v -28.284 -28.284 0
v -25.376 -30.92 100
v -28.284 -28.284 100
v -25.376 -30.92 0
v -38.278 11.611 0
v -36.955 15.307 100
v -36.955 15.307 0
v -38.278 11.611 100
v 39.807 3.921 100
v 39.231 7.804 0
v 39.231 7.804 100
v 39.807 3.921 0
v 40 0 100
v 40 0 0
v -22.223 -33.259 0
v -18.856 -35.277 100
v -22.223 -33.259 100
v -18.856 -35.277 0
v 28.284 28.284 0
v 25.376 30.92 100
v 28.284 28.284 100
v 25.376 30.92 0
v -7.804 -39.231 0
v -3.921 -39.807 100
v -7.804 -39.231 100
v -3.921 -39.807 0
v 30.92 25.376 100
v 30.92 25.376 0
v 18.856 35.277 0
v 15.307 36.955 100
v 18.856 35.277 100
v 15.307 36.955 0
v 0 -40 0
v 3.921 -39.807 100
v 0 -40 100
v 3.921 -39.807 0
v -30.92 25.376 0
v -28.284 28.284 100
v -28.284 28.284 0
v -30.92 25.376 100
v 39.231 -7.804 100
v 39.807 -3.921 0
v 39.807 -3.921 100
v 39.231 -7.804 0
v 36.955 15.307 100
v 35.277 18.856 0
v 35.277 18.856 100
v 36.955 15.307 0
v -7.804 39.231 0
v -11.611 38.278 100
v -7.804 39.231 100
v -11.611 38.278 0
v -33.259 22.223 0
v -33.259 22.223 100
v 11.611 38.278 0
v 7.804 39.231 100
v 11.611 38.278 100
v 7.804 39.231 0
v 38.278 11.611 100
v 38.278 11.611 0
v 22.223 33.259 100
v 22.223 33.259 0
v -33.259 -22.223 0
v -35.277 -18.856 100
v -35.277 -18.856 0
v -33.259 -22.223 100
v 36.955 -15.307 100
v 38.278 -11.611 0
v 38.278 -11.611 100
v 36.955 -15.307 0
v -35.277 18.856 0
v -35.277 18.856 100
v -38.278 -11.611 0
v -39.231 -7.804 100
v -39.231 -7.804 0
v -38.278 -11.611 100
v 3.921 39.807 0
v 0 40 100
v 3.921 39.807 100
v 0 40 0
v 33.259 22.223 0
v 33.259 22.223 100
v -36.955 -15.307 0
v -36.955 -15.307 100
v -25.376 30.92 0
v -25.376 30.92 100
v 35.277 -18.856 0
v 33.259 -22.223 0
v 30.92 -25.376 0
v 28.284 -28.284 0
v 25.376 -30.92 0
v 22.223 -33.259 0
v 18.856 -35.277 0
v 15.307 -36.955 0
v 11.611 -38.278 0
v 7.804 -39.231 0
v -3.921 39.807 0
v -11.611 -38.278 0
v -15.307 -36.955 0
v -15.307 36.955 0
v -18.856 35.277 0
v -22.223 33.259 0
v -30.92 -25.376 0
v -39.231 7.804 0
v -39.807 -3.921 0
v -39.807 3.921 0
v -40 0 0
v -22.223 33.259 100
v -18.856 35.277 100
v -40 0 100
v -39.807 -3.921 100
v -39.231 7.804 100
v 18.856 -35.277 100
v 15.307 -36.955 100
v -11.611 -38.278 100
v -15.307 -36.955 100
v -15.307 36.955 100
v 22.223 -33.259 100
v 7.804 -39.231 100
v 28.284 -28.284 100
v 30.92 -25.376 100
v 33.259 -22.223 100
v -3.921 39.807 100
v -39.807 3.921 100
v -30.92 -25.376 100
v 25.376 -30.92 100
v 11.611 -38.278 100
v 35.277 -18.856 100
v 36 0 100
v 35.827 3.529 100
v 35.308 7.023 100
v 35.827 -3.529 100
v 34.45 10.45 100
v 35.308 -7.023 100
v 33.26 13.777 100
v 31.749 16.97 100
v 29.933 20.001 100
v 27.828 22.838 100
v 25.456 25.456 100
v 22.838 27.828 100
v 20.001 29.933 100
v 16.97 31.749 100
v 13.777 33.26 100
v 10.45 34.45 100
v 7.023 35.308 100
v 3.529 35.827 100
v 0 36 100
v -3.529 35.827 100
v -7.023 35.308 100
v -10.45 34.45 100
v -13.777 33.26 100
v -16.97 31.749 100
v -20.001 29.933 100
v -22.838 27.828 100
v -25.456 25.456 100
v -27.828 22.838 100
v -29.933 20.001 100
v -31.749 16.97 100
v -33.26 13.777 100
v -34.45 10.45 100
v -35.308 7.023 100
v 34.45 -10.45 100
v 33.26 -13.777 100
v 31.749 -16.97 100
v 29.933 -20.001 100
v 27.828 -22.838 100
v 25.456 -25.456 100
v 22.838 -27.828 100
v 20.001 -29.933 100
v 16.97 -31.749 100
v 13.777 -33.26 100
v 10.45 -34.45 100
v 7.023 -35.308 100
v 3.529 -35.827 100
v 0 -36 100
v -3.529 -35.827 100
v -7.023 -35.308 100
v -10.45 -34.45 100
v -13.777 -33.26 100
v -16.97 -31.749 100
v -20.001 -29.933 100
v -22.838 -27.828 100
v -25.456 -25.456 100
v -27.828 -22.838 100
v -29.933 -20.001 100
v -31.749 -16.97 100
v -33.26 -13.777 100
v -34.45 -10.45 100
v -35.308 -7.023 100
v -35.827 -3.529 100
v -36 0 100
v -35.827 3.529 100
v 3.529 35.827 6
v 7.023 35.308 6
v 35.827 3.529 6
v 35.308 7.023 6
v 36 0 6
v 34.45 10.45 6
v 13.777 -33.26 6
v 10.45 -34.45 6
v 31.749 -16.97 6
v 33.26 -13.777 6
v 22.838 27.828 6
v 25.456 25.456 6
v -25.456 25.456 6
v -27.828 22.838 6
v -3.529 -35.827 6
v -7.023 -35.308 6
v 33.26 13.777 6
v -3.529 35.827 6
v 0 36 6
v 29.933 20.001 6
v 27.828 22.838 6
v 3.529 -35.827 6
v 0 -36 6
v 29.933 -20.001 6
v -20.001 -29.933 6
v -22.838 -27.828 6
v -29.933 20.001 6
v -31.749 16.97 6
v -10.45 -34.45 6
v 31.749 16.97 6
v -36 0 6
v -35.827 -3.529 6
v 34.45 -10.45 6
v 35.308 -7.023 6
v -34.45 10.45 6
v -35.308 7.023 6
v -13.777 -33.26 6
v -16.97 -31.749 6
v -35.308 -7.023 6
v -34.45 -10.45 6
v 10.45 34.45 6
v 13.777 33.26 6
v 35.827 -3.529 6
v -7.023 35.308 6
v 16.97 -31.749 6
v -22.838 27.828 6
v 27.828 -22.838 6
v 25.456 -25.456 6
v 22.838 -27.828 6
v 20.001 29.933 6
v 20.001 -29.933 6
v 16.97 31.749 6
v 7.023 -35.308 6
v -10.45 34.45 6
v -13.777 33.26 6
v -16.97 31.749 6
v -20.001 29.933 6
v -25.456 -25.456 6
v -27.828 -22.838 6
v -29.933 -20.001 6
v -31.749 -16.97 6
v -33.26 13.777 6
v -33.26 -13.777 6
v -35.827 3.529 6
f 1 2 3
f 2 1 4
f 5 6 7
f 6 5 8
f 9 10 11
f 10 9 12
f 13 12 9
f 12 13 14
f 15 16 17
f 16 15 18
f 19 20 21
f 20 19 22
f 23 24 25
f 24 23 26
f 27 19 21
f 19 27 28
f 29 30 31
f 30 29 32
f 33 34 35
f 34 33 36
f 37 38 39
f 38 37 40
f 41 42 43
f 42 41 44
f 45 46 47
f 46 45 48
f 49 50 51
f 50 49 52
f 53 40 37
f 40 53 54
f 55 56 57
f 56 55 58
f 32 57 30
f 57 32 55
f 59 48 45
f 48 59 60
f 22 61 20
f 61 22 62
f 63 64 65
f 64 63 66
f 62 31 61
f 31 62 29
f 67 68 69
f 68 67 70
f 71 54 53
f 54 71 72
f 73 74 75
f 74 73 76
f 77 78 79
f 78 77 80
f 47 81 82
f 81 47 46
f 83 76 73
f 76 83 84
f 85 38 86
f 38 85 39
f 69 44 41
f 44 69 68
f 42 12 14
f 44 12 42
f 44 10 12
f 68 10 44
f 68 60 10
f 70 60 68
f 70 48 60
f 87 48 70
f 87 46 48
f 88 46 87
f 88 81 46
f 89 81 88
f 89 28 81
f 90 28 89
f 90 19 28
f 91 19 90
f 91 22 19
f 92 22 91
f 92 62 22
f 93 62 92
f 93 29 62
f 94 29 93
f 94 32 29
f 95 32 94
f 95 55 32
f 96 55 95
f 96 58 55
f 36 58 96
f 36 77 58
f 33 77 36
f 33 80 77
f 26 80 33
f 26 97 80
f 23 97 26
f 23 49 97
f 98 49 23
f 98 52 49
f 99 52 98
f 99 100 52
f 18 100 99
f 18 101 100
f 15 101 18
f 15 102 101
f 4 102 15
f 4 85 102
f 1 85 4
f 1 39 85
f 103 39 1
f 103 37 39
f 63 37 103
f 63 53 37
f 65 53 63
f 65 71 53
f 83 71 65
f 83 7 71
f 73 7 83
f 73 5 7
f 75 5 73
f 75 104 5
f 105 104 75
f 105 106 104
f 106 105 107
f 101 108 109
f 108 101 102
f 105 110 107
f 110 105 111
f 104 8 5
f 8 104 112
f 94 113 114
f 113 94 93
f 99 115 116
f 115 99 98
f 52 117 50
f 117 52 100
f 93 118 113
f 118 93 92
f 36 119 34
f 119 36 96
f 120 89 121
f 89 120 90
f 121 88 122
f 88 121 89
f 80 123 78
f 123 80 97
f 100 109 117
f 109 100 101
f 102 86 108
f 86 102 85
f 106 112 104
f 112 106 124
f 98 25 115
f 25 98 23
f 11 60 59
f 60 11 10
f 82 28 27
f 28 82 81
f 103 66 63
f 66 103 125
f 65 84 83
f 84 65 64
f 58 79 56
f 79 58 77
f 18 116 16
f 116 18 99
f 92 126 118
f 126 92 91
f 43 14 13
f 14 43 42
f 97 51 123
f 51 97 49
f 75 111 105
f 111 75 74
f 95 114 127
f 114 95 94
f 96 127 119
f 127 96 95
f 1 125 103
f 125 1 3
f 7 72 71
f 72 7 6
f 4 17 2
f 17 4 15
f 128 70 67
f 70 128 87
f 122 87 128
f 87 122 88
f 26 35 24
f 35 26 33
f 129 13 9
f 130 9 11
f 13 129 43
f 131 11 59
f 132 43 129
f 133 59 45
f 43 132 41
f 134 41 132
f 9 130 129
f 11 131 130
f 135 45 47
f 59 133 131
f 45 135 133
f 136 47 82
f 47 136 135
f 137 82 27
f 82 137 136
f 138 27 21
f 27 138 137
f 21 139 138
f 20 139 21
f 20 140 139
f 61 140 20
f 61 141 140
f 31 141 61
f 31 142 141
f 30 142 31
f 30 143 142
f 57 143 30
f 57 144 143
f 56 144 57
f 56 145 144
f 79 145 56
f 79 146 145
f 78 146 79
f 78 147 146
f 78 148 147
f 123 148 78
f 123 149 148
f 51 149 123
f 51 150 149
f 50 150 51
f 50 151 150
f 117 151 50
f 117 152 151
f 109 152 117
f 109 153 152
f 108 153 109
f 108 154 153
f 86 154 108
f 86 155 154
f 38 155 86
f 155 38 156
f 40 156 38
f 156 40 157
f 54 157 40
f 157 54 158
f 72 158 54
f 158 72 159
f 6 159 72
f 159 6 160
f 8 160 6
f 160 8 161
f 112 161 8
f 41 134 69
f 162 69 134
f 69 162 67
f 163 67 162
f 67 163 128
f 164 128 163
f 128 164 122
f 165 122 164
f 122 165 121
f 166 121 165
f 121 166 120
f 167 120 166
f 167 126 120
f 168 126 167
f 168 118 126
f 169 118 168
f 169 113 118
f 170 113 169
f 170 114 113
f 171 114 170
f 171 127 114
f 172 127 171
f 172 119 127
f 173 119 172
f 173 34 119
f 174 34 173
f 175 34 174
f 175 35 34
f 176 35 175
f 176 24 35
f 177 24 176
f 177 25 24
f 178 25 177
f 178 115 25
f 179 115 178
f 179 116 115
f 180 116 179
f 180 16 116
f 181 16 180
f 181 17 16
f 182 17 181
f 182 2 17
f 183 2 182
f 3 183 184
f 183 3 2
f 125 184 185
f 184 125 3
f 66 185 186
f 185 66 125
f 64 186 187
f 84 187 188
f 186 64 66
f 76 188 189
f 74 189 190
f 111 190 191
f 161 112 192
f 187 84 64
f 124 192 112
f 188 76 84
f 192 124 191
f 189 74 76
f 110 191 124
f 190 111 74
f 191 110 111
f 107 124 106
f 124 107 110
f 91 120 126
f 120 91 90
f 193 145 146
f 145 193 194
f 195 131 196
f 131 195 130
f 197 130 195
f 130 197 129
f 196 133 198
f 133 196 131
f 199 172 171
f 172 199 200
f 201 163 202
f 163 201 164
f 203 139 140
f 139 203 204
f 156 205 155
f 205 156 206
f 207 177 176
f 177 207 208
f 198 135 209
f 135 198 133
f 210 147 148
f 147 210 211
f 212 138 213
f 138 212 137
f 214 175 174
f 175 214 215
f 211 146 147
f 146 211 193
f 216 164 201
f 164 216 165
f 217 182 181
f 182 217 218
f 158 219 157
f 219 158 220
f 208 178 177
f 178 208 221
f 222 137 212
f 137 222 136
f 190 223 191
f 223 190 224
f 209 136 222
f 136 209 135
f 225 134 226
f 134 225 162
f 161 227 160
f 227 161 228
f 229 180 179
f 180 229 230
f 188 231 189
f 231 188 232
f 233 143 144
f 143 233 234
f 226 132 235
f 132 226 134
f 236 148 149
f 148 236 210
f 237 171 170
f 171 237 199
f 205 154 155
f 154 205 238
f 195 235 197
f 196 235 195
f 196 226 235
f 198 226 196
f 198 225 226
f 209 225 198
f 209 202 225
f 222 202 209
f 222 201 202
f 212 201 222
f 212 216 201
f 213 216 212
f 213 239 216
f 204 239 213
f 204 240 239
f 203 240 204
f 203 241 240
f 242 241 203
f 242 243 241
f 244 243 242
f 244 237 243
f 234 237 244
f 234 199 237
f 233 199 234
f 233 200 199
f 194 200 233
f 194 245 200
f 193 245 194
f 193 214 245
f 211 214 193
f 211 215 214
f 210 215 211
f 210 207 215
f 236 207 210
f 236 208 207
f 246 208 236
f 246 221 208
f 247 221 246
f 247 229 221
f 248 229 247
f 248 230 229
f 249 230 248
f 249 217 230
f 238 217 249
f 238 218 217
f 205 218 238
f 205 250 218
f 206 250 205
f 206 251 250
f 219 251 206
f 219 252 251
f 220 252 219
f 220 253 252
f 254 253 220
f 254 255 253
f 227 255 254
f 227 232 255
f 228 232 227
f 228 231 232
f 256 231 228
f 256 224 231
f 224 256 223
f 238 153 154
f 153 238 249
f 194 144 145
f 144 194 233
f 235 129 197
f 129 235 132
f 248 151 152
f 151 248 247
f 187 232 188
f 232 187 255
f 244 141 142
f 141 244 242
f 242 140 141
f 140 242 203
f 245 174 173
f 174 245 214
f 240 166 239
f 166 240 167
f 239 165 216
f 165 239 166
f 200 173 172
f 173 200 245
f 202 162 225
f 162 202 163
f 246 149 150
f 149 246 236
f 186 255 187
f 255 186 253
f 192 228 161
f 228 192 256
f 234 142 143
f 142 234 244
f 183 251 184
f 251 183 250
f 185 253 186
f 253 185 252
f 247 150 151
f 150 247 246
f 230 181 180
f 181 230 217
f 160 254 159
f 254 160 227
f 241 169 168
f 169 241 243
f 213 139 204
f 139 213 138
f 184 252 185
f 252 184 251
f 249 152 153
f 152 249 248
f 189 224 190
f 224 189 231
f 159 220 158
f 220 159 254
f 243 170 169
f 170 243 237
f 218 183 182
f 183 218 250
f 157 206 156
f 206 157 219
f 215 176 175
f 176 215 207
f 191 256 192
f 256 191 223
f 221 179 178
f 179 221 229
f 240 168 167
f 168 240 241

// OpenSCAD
$fn = 64;

// パラメータ
outer_diameter = 80;
height = 100;
wall_thickness = 4;
bottom_thickness = 6;
handle_protrusion = 12; // 外径方向への飛び出し量
handle_ring_thickness = 12; // 取手の太さ（直径）

// 内寸の計算
inner_diameter = outer_diameter - (2 * wall_thickness);
inner_height = height - bottom_thickness;

// 取っ手の計算
// 取っ手の外側の端が「外径 + 飛び出し量」になるように配置
// 外径半径 = 40mm, 飛び出し = 12mm => 外端 = 52mm
// 取っ手半径 = 6mm (直径12mm)
// 取っ手の中心半径 = 52 - 6 = 46mm
handle_r = handle_ring_thickness / 2;
handle_major_r = (outer_diameter / 2) + handle_protrusion - handle_r;

// 形状の構築
union() {
    // マグカップ本体
    difference() {
        // 外側の円柱
        cylinder(d = outer_diameter, h = height);
        
        // 内側の空間（底面を考慮して上にオフセット）
        translate([0, 0, bottom_thickness])
            cylinder(d = inner_diameter, h = inner_height + 1);
    }

    // 取っ手 (リング状)
    translate([handle_major_r, 0, height / 2])
    rotate([0, 90, 0])
    rotate_extrude()
    translate([handle_r, 0, 0])
    circle(r = handle_r);
}
